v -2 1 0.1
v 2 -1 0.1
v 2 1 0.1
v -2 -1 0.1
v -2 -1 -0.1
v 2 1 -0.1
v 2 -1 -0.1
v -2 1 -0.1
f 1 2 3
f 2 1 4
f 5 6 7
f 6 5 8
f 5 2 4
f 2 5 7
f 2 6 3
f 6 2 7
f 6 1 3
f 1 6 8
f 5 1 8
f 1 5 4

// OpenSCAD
module Street_01(col ="#3b4747"){
color(col)
cube([4,2,0.2], center = true);

}


Street_01();
